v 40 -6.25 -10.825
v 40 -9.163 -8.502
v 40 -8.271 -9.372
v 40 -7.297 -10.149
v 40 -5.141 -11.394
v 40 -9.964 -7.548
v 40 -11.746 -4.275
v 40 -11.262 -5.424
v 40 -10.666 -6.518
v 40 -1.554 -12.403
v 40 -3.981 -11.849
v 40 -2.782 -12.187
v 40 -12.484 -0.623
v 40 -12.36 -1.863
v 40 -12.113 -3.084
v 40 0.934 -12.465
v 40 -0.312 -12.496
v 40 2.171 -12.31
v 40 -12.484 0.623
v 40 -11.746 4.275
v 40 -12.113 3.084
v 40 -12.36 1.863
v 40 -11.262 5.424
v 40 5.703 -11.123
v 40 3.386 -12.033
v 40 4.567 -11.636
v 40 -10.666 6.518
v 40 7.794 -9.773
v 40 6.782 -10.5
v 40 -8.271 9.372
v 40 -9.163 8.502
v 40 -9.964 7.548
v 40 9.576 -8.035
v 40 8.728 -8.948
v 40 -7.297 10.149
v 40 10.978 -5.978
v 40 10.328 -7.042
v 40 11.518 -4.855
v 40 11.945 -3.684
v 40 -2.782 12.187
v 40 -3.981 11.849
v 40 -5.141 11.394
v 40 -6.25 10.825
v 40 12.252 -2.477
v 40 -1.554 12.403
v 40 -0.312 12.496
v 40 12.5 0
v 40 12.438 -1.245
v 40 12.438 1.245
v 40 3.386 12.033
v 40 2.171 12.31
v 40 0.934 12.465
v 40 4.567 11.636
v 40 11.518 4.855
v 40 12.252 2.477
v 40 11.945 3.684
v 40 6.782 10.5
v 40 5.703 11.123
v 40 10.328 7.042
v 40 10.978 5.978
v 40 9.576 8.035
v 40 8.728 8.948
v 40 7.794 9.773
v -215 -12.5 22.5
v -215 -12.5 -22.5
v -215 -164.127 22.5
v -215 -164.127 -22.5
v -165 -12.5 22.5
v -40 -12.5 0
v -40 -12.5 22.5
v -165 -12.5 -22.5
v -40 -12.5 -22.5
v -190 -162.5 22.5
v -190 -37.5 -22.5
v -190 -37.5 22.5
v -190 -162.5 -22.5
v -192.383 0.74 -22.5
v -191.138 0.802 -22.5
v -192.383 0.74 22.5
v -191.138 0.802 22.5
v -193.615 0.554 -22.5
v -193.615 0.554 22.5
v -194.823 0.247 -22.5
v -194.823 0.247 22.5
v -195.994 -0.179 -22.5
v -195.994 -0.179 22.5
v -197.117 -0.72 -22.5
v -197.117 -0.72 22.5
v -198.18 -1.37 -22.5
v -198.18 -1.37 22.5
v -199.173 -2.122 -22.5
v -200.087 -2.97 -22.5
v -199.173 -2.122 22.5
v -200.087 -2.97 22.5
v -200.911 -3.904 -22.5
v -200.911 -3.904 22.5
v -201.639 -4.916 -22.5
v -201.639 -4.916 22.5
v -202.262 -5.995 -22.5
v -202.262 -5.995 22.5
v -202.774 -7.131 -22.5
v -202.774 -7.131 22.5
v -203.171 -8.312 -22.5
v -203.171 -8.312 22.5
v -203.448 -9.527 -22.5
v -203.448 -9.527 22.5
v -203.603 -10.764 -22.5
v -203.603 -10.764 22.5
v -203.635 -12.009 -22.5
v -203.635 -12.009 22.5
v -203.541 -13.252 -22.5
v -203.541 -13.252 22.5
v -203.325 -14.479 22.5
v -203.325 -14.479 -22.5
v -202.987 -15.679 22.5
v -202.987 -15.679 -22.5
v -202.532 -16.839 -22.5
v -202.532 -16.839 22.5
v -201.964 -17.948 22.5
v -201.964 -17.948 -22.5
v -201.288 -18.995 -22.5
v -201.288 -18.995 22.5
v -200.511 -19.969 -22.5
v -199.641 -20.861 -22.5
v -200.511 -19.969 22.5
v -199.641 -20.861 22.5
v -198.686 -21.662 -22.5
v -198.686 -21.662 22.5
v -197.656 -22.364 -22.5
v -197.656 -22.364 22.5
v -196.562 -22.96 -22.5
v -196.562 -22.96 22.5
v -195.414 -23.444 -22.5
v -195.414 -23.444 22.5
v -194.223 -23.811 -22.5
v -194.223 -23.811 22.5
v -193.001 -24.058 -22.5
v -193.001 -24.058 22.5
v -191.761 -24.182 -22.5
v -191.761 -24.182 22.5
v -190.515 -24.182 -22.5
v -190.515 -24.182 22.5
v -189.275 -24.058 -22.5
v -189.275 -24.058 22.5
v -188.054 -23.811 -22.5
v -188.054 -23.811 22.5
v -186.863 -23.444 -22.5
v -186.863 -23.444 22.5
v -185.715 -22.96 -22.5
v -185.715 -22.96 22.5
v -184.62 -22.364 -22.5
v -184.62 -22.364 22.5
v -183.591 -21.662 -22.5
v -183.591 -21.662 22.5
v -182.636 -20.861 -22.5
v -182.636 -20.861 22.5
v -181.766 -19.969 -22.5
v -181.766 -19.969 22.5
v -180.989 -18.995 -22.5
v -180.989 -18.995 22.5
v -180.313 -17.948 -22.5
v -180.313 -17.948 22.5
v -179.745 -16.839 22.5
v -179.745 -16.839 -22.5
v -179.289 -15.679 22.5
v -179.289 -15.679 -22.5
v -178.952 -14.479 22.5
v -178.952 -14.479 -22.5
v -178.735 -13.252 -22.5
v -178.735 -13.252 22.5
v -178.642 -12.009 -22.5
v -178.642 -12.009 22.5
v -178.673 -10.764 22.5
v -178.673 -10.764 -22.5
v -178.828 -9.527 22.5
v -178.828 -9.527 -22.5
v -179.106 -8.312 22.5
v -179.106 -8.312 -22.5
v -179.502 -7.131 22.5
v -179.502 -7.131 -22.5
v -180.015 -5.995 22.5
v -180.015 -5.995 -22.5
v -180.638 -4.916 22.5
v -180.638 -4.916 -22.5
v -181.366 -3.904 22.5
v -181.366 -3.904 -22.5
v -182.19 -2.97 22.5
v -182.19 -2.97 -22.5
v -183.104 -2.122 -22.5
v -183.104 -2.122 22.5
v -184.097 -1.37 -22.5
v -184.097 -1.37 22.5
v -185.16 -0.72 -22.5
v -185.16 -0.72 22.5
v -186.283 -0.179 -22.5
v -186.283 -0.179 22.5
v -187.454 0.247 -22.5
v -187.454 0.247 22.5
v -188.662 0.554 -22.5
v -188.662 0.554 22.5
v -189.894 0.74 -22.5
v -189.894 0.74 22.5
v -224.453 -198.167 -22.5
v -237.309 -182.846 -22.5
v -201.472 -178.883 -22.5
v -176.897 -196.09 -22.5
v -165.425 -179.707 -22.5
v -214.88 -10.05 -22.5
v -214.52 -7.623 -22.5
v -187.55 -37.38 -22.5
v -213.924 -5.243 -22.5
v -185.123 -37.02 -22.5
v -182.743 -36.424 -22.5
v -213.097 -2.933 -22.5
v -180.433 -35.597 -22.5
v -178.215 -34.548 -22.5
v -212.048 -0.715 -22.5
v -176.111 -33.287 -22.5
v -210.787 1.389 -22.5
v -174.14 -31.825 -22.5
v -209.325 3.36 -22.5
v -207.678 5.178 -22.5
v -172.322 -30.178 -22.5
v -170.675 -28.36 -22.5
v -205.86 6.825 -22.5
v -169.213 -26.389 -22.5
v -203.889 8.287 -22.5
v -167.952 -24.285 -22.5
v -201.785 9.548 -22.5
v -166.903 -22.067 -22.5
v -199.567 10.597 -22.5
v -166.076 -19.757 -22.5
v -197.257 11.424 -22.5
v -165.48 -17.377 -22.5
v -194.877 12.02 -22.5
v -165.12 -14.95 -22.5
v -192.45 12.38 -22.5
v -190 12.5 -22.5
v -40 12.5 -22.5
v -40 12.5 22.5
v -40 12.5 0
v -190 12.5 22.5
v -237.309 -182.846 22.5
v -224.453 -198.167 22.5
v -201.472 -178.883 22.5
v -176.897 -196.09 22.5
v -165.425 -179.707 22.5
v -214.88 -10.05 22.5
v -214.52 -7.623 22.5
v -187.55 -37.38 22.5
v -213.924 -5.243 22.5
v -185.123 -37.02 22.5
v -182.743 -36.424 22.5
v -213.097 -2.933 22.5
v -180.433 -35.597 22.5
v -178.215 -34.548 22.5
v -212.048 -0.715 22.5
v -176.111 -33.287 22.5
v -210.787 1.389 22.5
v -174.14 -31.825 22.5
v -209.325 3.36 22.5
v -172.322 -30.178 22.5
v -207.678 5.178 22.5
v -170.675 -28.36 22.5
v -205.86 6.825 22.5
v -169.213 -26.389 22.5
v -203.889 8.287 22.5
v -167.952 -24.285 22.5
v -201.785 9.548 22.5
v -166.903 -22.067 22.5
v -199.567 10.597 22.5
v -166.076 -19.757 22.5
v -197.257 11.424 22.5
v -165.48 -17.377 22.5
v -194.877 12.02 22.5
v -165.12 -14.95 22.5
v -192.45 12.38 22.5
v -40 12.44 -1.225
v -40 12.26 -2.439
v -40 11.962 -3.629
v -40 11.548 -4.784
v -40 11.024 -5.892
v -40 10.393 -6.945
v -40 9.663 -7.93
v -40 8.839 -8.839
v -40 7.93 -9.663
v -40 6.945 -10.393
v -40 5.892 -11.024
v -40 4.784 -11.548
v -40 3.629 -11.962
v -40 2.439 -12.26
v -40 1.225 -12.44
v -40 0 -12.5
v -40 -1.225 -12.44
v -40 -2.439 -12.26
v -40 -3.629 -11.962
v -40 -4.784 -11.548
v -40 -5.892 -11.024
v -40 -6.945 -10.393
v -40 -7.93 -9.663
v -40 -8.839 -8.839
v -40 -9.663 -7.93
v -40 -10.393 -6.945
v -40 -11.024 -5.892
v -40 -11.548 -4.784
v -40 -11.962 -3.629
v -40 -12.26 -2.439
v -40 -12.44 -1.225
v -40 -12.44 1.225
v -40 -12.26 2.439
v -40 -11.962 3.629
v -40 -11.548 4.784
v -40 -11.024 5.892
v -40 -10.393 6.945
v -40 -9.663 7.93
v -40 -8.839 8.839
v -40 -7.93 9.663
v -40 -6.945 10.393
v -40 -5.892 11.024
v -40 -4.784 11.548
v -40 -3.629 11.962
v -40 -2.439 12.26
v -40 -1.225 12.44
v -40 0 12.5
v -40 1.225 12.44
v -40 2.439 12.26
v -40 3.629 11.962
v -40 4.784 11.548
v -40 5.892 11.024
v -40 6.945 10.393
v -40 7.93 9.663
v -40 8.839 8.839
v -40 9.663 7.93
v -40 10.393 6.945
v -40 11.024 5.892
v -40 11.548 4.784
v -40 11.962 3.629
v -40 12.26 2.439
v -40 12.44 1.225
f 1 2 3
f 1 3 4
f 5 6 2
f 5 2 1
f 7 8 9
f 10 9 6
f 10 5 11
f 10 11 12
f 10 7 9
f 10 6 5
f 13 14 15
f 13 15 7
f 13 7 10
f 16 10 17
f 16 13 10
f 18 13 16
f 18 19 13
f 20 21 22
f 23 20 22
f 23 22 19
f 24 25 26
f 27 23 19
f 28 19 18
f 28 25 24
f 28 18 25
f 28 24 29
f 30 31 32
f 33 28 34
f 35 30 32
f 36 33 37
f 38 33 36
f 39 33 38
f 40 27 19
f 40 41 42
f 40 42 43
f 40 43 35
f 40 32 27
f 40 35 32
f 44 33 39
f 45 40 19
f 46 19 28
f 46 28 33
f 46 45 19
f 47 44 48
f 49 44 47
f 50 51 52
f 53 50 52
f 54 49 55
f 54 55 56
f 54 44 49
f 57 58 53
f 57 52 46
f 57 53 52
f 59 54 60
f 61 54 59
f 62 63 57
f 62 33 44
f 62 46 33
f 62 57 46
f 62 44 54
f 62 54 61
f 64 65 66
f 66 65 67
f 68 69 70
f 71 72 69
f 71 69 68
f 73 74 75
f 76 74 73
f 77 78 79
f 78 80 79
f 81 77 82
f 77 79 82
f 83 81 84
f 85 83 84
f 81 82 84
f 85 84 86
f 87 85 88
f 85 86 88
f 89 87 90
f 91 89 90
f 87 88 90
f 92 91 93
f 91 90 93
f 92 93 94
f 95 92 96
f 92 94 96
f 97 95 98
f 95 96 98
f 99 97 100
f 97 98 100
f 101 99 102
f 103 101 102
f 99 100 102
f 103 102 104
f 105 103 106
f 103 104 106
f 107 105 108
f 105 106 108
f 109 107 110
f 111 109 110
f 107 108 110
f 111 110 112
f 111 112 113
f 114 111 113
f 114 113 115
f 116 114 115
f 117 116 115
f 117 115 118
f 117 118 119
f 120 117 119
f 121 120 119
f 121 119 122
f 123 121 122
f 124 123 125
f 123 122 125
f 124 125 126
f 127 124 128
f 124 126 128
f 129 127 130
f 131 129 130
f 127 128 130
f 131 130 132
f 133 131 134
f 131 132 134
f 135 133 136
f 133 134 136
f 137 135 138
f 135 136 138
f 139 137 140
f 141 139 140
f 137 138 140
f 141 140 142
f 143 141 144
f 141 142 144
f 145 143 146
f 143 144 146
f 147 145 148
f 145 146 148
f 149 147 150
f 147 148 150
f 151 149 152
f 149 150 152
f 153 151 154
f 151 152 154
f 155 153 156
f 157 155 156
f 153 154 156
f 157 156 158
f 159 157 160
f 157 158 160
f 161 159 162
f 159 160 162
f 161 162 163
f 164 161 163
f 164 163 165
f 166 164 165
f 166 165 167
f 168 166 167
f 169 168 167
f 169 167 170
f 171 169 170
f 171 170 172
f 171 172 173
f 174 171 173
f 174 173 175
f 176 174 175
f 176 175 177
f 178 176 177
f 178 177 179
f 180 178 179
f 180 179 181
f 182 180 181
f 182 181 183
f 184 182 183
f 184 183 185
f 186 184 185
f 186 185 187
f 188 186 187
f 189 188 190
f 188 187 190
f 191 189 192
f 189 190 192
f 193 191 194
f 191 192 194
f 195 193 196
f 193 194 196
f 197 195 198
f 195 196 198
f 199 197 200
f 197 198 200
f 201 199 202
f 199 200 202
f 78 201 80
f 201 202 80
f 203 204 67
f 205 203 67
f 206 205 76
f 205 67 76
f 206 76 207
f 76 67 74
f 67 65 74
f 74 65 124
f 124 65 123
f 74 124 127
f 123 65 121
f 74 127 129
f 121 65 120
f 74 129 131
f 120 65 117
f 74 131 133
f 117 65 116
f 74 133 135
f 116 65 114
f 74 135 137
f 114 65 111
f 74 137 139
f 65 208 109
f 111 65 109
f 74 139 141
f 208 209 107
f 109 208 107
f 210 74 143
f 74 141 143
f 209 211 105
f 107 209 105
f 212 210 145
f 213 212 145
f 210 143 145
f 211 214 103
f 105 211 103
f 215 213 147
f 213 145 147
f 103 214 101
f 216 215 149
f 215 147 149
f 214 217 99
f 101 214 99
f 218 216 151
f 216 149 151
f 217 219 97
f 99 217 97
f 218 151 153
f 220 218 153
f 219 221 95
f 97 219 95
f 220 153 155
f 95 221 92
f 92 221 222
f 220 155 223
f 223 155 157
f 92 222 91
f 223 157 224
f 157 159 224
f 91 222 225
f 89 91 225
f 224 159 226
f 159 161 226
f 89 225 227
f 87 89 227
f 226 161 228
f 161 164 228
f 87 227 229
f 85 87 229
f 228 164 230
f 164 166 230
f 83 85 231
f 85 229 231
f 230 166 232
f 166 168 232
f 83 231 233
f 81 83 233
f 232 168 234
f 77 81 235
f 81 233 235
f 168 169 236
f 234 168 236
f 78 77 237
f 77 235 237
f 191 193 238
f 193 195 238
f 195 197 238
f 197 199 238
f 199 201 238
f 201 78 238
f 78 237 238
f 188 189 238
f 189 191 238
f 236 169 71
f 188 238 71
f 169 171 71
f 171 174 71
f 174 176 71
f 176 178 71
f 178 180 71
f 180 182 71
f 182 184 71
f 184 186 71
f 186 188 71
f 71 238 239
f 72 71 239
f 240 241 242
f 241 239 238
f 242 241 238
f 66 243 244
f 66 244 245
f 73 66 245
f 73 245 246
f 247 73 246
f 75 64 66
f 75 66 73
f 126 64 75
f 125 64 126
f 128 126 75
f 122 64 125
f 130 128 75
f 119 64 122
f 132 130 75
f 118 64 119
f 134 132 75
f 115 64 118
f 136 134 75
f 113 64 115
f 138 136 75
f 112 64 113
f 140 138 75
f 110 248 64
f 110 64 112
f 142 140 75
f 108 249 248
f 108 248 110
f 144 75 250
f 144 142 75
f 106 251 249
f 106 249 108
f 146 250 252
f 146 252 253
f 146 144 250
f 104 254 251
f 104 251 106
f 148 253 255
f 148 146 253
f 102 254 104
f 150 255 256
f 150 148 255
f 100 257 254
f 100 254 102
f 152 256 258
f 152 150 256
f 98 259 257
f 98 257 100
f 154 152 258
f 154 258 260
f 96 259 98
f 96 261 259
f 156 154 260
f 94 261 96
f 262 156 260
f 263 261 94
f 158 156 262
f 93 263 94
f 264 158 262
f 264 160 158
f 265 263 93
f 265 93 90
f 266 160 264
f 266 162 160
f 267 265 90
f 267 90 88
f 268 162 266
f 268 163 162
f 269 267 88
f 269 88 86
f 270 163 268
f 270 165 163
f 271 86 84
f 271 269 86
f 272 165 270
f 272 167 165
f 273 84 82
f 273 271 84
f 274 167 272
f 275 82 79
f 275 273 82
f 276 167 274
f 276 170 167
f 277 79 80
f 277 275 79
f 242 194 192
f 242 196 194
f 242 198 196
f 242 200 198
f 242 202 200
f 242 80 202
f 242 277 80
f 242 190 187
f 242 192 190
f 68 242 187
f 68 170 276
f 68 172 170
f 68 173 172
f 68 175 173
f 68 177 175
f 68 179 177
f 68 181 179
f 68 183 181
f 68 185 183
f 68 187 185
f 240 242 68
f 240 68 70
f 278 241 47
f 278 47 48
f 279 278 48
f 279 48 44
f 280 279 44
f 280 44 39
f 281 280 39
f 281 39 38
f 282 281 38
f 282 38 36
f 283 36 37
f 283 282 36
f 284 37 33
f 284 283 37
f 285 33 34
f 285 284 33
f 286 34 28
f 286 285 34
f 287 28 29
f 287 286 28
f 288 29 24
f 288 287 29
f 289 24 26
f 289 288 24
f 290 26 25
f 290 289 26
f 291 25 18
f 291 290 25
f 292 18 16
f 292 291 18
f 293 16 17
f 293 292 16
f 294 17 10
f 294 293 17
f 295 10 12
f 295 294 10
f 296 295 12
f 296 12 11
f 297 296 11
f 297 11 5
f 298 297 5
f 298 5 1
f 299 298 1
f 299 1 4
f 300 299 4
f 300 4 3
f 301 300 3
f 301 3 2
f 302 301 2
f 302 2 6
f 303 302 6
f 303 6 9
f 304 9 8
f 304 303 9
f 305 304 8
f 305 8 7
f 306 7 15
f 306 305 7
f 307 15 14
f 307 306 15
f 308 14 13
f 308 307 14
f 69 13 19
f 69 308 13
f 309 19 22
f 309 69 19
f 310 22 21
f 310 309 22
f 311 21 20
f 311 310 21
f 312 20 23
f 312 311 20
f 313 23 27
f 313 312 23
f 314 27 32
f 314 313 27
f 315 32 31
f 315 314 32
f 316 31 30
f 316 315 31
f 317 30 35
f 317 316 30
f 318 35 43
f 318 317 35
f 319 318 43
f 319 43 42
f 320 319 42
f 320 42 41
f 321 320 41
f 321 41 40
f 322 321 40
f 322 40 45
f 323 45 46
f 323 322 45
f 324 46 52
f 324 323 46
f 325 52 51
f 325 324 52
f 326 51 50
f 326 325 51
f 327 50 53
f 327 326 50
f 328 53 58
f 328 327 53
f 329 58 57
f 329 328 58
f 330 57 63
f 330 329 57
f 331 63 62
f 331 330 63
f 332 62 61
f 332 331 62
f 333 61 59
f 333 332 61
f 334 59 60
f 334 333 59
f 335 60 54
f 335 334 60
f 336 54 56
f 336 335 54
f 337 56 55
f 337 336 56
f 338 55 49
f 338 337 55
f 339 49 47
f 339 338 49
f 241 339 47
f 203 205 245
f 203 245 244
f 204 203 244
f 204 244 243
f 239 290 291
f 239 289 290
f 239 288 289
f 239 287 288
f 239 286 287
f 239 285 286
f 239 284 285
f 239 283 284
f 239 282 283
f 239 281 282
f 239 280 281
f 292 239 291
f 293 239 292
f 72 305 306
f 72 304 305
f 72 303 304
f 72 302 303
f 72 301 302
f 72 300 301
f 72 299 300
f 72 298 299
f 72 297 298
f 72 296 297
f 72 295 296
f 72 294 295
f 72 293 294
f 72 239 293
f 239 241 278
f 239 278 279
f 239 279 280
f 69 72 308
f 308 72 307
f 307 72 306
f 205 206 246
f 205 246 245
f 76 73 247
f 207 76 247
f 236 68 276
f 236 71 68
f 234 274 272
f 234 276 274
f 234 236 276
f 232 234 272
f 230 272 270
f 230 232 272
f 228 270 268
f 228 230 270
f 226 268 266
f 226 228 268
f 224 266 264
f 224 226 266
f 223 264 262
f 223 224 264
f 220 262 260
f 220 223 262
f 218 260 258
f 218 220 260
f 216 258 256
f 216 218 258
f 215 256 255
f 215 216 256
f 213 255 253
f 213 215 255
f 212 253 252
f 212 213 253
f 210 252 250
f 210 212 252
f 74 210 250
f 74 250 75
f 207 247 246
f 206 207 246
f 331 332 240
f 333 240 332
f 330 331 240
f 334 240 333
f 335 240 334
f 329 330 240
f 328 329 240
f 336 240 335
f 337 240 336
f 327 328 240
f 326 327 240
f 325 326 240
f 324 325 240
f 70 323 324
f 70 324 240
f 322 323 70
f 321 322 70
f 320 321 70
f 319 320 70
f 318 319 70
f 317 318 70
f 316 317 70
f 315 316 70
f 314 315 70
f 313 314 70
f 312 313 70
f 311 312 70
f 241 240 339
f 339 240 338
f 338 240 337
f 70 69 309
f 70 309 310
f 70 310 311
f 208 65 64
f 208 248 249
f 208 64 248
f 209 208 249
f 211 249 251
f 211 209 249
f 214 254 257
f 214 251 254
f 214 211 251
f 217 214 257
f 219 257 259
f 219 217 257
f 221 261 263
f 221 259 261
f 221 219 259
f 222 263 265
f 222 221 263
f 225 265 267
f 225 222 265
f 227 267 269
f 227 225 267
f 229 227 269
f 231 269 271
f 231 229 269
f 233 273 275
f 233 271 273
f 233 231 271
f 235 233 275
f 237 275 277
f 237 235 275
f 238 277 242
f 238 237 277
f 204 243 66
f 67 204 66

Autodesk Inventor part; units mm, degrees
ref_plane "YZ Plane" through (0, 0, 0) normal (1, 0, 0) x (0, 1, 0)
ref_plane "XZ Plane" through (0, 0, 0) normal (0, 1, 0) x (-1, 0, 0)
ref_plane "XY Plane" through (0, 0, 0) normal (0, 0, 1) x (1, 0, 0)
sketch "Sketch1" plane through (0, 0, 0) normal (1, 0, 0) x (0, 1, 0)
  circle A0 centre (0, 0) radius 12.5
  dimension "d0" = 25
extrude "Extrusion1" add sketch "Sketch1" along normal mid plane 80
sketch "Sketch2" plane through (0, 0, 0) normal (0, 0, 1) x (1, 0, 0)
  line L0 (-40, 12.5) -> (-40, -12.5) projected
  line L1 (-40, 12.5) -> (-190, 12.5)
  line L2 (-40, -12.5) -> (-165, -12.5)
  circle A0 centre (-190, -12.5) radius 25
  line L3 (-215, -12.5) -> (-215, -164.1266)
  line L4 (-190, -37.5) -> (-190, -162.5)
  line L5 (-190, -162.5) -> (-165.4254, -179.7073)
  line L6 (-190, -162.5) -> (-160, -162.5) construction
  line L7 (-165.4254, -179.7073) -> (-176.897, -196.0903)
  line L8 (-176.897, -196.0903) -> (-201.4715, -178.883)
  line L9 (-201.4715, -178.883) -> (-224.4529, -198.1667)
  line L10 (-224.4529, -198.1667) -> (-237.3086, -182.8458)
  line L11 (-237.3086, -182.8458) -> (-215, -164.1266)
  point P0 (0, 0)
  point P1 (-165, -12.5)
  dimension "d3" = 150
  dimension "d4" = 125
extrude "Extrusion2" add sketch "Sketch2" along normal mid plane 45
sketch "Sketch3" plane through (0, 0, -22.5) normal (0, 0, -1) x (-1, 0, 0)
  circle A0 centre (191.1384, -11.6978) radius 12.5
  point P0 (0, 0)
hole "Hole1" at (-191.1384, -11.6978, -22.5) direction (0, 0, 1) diameter 25 depth 45
properties part number "Hand 4"
